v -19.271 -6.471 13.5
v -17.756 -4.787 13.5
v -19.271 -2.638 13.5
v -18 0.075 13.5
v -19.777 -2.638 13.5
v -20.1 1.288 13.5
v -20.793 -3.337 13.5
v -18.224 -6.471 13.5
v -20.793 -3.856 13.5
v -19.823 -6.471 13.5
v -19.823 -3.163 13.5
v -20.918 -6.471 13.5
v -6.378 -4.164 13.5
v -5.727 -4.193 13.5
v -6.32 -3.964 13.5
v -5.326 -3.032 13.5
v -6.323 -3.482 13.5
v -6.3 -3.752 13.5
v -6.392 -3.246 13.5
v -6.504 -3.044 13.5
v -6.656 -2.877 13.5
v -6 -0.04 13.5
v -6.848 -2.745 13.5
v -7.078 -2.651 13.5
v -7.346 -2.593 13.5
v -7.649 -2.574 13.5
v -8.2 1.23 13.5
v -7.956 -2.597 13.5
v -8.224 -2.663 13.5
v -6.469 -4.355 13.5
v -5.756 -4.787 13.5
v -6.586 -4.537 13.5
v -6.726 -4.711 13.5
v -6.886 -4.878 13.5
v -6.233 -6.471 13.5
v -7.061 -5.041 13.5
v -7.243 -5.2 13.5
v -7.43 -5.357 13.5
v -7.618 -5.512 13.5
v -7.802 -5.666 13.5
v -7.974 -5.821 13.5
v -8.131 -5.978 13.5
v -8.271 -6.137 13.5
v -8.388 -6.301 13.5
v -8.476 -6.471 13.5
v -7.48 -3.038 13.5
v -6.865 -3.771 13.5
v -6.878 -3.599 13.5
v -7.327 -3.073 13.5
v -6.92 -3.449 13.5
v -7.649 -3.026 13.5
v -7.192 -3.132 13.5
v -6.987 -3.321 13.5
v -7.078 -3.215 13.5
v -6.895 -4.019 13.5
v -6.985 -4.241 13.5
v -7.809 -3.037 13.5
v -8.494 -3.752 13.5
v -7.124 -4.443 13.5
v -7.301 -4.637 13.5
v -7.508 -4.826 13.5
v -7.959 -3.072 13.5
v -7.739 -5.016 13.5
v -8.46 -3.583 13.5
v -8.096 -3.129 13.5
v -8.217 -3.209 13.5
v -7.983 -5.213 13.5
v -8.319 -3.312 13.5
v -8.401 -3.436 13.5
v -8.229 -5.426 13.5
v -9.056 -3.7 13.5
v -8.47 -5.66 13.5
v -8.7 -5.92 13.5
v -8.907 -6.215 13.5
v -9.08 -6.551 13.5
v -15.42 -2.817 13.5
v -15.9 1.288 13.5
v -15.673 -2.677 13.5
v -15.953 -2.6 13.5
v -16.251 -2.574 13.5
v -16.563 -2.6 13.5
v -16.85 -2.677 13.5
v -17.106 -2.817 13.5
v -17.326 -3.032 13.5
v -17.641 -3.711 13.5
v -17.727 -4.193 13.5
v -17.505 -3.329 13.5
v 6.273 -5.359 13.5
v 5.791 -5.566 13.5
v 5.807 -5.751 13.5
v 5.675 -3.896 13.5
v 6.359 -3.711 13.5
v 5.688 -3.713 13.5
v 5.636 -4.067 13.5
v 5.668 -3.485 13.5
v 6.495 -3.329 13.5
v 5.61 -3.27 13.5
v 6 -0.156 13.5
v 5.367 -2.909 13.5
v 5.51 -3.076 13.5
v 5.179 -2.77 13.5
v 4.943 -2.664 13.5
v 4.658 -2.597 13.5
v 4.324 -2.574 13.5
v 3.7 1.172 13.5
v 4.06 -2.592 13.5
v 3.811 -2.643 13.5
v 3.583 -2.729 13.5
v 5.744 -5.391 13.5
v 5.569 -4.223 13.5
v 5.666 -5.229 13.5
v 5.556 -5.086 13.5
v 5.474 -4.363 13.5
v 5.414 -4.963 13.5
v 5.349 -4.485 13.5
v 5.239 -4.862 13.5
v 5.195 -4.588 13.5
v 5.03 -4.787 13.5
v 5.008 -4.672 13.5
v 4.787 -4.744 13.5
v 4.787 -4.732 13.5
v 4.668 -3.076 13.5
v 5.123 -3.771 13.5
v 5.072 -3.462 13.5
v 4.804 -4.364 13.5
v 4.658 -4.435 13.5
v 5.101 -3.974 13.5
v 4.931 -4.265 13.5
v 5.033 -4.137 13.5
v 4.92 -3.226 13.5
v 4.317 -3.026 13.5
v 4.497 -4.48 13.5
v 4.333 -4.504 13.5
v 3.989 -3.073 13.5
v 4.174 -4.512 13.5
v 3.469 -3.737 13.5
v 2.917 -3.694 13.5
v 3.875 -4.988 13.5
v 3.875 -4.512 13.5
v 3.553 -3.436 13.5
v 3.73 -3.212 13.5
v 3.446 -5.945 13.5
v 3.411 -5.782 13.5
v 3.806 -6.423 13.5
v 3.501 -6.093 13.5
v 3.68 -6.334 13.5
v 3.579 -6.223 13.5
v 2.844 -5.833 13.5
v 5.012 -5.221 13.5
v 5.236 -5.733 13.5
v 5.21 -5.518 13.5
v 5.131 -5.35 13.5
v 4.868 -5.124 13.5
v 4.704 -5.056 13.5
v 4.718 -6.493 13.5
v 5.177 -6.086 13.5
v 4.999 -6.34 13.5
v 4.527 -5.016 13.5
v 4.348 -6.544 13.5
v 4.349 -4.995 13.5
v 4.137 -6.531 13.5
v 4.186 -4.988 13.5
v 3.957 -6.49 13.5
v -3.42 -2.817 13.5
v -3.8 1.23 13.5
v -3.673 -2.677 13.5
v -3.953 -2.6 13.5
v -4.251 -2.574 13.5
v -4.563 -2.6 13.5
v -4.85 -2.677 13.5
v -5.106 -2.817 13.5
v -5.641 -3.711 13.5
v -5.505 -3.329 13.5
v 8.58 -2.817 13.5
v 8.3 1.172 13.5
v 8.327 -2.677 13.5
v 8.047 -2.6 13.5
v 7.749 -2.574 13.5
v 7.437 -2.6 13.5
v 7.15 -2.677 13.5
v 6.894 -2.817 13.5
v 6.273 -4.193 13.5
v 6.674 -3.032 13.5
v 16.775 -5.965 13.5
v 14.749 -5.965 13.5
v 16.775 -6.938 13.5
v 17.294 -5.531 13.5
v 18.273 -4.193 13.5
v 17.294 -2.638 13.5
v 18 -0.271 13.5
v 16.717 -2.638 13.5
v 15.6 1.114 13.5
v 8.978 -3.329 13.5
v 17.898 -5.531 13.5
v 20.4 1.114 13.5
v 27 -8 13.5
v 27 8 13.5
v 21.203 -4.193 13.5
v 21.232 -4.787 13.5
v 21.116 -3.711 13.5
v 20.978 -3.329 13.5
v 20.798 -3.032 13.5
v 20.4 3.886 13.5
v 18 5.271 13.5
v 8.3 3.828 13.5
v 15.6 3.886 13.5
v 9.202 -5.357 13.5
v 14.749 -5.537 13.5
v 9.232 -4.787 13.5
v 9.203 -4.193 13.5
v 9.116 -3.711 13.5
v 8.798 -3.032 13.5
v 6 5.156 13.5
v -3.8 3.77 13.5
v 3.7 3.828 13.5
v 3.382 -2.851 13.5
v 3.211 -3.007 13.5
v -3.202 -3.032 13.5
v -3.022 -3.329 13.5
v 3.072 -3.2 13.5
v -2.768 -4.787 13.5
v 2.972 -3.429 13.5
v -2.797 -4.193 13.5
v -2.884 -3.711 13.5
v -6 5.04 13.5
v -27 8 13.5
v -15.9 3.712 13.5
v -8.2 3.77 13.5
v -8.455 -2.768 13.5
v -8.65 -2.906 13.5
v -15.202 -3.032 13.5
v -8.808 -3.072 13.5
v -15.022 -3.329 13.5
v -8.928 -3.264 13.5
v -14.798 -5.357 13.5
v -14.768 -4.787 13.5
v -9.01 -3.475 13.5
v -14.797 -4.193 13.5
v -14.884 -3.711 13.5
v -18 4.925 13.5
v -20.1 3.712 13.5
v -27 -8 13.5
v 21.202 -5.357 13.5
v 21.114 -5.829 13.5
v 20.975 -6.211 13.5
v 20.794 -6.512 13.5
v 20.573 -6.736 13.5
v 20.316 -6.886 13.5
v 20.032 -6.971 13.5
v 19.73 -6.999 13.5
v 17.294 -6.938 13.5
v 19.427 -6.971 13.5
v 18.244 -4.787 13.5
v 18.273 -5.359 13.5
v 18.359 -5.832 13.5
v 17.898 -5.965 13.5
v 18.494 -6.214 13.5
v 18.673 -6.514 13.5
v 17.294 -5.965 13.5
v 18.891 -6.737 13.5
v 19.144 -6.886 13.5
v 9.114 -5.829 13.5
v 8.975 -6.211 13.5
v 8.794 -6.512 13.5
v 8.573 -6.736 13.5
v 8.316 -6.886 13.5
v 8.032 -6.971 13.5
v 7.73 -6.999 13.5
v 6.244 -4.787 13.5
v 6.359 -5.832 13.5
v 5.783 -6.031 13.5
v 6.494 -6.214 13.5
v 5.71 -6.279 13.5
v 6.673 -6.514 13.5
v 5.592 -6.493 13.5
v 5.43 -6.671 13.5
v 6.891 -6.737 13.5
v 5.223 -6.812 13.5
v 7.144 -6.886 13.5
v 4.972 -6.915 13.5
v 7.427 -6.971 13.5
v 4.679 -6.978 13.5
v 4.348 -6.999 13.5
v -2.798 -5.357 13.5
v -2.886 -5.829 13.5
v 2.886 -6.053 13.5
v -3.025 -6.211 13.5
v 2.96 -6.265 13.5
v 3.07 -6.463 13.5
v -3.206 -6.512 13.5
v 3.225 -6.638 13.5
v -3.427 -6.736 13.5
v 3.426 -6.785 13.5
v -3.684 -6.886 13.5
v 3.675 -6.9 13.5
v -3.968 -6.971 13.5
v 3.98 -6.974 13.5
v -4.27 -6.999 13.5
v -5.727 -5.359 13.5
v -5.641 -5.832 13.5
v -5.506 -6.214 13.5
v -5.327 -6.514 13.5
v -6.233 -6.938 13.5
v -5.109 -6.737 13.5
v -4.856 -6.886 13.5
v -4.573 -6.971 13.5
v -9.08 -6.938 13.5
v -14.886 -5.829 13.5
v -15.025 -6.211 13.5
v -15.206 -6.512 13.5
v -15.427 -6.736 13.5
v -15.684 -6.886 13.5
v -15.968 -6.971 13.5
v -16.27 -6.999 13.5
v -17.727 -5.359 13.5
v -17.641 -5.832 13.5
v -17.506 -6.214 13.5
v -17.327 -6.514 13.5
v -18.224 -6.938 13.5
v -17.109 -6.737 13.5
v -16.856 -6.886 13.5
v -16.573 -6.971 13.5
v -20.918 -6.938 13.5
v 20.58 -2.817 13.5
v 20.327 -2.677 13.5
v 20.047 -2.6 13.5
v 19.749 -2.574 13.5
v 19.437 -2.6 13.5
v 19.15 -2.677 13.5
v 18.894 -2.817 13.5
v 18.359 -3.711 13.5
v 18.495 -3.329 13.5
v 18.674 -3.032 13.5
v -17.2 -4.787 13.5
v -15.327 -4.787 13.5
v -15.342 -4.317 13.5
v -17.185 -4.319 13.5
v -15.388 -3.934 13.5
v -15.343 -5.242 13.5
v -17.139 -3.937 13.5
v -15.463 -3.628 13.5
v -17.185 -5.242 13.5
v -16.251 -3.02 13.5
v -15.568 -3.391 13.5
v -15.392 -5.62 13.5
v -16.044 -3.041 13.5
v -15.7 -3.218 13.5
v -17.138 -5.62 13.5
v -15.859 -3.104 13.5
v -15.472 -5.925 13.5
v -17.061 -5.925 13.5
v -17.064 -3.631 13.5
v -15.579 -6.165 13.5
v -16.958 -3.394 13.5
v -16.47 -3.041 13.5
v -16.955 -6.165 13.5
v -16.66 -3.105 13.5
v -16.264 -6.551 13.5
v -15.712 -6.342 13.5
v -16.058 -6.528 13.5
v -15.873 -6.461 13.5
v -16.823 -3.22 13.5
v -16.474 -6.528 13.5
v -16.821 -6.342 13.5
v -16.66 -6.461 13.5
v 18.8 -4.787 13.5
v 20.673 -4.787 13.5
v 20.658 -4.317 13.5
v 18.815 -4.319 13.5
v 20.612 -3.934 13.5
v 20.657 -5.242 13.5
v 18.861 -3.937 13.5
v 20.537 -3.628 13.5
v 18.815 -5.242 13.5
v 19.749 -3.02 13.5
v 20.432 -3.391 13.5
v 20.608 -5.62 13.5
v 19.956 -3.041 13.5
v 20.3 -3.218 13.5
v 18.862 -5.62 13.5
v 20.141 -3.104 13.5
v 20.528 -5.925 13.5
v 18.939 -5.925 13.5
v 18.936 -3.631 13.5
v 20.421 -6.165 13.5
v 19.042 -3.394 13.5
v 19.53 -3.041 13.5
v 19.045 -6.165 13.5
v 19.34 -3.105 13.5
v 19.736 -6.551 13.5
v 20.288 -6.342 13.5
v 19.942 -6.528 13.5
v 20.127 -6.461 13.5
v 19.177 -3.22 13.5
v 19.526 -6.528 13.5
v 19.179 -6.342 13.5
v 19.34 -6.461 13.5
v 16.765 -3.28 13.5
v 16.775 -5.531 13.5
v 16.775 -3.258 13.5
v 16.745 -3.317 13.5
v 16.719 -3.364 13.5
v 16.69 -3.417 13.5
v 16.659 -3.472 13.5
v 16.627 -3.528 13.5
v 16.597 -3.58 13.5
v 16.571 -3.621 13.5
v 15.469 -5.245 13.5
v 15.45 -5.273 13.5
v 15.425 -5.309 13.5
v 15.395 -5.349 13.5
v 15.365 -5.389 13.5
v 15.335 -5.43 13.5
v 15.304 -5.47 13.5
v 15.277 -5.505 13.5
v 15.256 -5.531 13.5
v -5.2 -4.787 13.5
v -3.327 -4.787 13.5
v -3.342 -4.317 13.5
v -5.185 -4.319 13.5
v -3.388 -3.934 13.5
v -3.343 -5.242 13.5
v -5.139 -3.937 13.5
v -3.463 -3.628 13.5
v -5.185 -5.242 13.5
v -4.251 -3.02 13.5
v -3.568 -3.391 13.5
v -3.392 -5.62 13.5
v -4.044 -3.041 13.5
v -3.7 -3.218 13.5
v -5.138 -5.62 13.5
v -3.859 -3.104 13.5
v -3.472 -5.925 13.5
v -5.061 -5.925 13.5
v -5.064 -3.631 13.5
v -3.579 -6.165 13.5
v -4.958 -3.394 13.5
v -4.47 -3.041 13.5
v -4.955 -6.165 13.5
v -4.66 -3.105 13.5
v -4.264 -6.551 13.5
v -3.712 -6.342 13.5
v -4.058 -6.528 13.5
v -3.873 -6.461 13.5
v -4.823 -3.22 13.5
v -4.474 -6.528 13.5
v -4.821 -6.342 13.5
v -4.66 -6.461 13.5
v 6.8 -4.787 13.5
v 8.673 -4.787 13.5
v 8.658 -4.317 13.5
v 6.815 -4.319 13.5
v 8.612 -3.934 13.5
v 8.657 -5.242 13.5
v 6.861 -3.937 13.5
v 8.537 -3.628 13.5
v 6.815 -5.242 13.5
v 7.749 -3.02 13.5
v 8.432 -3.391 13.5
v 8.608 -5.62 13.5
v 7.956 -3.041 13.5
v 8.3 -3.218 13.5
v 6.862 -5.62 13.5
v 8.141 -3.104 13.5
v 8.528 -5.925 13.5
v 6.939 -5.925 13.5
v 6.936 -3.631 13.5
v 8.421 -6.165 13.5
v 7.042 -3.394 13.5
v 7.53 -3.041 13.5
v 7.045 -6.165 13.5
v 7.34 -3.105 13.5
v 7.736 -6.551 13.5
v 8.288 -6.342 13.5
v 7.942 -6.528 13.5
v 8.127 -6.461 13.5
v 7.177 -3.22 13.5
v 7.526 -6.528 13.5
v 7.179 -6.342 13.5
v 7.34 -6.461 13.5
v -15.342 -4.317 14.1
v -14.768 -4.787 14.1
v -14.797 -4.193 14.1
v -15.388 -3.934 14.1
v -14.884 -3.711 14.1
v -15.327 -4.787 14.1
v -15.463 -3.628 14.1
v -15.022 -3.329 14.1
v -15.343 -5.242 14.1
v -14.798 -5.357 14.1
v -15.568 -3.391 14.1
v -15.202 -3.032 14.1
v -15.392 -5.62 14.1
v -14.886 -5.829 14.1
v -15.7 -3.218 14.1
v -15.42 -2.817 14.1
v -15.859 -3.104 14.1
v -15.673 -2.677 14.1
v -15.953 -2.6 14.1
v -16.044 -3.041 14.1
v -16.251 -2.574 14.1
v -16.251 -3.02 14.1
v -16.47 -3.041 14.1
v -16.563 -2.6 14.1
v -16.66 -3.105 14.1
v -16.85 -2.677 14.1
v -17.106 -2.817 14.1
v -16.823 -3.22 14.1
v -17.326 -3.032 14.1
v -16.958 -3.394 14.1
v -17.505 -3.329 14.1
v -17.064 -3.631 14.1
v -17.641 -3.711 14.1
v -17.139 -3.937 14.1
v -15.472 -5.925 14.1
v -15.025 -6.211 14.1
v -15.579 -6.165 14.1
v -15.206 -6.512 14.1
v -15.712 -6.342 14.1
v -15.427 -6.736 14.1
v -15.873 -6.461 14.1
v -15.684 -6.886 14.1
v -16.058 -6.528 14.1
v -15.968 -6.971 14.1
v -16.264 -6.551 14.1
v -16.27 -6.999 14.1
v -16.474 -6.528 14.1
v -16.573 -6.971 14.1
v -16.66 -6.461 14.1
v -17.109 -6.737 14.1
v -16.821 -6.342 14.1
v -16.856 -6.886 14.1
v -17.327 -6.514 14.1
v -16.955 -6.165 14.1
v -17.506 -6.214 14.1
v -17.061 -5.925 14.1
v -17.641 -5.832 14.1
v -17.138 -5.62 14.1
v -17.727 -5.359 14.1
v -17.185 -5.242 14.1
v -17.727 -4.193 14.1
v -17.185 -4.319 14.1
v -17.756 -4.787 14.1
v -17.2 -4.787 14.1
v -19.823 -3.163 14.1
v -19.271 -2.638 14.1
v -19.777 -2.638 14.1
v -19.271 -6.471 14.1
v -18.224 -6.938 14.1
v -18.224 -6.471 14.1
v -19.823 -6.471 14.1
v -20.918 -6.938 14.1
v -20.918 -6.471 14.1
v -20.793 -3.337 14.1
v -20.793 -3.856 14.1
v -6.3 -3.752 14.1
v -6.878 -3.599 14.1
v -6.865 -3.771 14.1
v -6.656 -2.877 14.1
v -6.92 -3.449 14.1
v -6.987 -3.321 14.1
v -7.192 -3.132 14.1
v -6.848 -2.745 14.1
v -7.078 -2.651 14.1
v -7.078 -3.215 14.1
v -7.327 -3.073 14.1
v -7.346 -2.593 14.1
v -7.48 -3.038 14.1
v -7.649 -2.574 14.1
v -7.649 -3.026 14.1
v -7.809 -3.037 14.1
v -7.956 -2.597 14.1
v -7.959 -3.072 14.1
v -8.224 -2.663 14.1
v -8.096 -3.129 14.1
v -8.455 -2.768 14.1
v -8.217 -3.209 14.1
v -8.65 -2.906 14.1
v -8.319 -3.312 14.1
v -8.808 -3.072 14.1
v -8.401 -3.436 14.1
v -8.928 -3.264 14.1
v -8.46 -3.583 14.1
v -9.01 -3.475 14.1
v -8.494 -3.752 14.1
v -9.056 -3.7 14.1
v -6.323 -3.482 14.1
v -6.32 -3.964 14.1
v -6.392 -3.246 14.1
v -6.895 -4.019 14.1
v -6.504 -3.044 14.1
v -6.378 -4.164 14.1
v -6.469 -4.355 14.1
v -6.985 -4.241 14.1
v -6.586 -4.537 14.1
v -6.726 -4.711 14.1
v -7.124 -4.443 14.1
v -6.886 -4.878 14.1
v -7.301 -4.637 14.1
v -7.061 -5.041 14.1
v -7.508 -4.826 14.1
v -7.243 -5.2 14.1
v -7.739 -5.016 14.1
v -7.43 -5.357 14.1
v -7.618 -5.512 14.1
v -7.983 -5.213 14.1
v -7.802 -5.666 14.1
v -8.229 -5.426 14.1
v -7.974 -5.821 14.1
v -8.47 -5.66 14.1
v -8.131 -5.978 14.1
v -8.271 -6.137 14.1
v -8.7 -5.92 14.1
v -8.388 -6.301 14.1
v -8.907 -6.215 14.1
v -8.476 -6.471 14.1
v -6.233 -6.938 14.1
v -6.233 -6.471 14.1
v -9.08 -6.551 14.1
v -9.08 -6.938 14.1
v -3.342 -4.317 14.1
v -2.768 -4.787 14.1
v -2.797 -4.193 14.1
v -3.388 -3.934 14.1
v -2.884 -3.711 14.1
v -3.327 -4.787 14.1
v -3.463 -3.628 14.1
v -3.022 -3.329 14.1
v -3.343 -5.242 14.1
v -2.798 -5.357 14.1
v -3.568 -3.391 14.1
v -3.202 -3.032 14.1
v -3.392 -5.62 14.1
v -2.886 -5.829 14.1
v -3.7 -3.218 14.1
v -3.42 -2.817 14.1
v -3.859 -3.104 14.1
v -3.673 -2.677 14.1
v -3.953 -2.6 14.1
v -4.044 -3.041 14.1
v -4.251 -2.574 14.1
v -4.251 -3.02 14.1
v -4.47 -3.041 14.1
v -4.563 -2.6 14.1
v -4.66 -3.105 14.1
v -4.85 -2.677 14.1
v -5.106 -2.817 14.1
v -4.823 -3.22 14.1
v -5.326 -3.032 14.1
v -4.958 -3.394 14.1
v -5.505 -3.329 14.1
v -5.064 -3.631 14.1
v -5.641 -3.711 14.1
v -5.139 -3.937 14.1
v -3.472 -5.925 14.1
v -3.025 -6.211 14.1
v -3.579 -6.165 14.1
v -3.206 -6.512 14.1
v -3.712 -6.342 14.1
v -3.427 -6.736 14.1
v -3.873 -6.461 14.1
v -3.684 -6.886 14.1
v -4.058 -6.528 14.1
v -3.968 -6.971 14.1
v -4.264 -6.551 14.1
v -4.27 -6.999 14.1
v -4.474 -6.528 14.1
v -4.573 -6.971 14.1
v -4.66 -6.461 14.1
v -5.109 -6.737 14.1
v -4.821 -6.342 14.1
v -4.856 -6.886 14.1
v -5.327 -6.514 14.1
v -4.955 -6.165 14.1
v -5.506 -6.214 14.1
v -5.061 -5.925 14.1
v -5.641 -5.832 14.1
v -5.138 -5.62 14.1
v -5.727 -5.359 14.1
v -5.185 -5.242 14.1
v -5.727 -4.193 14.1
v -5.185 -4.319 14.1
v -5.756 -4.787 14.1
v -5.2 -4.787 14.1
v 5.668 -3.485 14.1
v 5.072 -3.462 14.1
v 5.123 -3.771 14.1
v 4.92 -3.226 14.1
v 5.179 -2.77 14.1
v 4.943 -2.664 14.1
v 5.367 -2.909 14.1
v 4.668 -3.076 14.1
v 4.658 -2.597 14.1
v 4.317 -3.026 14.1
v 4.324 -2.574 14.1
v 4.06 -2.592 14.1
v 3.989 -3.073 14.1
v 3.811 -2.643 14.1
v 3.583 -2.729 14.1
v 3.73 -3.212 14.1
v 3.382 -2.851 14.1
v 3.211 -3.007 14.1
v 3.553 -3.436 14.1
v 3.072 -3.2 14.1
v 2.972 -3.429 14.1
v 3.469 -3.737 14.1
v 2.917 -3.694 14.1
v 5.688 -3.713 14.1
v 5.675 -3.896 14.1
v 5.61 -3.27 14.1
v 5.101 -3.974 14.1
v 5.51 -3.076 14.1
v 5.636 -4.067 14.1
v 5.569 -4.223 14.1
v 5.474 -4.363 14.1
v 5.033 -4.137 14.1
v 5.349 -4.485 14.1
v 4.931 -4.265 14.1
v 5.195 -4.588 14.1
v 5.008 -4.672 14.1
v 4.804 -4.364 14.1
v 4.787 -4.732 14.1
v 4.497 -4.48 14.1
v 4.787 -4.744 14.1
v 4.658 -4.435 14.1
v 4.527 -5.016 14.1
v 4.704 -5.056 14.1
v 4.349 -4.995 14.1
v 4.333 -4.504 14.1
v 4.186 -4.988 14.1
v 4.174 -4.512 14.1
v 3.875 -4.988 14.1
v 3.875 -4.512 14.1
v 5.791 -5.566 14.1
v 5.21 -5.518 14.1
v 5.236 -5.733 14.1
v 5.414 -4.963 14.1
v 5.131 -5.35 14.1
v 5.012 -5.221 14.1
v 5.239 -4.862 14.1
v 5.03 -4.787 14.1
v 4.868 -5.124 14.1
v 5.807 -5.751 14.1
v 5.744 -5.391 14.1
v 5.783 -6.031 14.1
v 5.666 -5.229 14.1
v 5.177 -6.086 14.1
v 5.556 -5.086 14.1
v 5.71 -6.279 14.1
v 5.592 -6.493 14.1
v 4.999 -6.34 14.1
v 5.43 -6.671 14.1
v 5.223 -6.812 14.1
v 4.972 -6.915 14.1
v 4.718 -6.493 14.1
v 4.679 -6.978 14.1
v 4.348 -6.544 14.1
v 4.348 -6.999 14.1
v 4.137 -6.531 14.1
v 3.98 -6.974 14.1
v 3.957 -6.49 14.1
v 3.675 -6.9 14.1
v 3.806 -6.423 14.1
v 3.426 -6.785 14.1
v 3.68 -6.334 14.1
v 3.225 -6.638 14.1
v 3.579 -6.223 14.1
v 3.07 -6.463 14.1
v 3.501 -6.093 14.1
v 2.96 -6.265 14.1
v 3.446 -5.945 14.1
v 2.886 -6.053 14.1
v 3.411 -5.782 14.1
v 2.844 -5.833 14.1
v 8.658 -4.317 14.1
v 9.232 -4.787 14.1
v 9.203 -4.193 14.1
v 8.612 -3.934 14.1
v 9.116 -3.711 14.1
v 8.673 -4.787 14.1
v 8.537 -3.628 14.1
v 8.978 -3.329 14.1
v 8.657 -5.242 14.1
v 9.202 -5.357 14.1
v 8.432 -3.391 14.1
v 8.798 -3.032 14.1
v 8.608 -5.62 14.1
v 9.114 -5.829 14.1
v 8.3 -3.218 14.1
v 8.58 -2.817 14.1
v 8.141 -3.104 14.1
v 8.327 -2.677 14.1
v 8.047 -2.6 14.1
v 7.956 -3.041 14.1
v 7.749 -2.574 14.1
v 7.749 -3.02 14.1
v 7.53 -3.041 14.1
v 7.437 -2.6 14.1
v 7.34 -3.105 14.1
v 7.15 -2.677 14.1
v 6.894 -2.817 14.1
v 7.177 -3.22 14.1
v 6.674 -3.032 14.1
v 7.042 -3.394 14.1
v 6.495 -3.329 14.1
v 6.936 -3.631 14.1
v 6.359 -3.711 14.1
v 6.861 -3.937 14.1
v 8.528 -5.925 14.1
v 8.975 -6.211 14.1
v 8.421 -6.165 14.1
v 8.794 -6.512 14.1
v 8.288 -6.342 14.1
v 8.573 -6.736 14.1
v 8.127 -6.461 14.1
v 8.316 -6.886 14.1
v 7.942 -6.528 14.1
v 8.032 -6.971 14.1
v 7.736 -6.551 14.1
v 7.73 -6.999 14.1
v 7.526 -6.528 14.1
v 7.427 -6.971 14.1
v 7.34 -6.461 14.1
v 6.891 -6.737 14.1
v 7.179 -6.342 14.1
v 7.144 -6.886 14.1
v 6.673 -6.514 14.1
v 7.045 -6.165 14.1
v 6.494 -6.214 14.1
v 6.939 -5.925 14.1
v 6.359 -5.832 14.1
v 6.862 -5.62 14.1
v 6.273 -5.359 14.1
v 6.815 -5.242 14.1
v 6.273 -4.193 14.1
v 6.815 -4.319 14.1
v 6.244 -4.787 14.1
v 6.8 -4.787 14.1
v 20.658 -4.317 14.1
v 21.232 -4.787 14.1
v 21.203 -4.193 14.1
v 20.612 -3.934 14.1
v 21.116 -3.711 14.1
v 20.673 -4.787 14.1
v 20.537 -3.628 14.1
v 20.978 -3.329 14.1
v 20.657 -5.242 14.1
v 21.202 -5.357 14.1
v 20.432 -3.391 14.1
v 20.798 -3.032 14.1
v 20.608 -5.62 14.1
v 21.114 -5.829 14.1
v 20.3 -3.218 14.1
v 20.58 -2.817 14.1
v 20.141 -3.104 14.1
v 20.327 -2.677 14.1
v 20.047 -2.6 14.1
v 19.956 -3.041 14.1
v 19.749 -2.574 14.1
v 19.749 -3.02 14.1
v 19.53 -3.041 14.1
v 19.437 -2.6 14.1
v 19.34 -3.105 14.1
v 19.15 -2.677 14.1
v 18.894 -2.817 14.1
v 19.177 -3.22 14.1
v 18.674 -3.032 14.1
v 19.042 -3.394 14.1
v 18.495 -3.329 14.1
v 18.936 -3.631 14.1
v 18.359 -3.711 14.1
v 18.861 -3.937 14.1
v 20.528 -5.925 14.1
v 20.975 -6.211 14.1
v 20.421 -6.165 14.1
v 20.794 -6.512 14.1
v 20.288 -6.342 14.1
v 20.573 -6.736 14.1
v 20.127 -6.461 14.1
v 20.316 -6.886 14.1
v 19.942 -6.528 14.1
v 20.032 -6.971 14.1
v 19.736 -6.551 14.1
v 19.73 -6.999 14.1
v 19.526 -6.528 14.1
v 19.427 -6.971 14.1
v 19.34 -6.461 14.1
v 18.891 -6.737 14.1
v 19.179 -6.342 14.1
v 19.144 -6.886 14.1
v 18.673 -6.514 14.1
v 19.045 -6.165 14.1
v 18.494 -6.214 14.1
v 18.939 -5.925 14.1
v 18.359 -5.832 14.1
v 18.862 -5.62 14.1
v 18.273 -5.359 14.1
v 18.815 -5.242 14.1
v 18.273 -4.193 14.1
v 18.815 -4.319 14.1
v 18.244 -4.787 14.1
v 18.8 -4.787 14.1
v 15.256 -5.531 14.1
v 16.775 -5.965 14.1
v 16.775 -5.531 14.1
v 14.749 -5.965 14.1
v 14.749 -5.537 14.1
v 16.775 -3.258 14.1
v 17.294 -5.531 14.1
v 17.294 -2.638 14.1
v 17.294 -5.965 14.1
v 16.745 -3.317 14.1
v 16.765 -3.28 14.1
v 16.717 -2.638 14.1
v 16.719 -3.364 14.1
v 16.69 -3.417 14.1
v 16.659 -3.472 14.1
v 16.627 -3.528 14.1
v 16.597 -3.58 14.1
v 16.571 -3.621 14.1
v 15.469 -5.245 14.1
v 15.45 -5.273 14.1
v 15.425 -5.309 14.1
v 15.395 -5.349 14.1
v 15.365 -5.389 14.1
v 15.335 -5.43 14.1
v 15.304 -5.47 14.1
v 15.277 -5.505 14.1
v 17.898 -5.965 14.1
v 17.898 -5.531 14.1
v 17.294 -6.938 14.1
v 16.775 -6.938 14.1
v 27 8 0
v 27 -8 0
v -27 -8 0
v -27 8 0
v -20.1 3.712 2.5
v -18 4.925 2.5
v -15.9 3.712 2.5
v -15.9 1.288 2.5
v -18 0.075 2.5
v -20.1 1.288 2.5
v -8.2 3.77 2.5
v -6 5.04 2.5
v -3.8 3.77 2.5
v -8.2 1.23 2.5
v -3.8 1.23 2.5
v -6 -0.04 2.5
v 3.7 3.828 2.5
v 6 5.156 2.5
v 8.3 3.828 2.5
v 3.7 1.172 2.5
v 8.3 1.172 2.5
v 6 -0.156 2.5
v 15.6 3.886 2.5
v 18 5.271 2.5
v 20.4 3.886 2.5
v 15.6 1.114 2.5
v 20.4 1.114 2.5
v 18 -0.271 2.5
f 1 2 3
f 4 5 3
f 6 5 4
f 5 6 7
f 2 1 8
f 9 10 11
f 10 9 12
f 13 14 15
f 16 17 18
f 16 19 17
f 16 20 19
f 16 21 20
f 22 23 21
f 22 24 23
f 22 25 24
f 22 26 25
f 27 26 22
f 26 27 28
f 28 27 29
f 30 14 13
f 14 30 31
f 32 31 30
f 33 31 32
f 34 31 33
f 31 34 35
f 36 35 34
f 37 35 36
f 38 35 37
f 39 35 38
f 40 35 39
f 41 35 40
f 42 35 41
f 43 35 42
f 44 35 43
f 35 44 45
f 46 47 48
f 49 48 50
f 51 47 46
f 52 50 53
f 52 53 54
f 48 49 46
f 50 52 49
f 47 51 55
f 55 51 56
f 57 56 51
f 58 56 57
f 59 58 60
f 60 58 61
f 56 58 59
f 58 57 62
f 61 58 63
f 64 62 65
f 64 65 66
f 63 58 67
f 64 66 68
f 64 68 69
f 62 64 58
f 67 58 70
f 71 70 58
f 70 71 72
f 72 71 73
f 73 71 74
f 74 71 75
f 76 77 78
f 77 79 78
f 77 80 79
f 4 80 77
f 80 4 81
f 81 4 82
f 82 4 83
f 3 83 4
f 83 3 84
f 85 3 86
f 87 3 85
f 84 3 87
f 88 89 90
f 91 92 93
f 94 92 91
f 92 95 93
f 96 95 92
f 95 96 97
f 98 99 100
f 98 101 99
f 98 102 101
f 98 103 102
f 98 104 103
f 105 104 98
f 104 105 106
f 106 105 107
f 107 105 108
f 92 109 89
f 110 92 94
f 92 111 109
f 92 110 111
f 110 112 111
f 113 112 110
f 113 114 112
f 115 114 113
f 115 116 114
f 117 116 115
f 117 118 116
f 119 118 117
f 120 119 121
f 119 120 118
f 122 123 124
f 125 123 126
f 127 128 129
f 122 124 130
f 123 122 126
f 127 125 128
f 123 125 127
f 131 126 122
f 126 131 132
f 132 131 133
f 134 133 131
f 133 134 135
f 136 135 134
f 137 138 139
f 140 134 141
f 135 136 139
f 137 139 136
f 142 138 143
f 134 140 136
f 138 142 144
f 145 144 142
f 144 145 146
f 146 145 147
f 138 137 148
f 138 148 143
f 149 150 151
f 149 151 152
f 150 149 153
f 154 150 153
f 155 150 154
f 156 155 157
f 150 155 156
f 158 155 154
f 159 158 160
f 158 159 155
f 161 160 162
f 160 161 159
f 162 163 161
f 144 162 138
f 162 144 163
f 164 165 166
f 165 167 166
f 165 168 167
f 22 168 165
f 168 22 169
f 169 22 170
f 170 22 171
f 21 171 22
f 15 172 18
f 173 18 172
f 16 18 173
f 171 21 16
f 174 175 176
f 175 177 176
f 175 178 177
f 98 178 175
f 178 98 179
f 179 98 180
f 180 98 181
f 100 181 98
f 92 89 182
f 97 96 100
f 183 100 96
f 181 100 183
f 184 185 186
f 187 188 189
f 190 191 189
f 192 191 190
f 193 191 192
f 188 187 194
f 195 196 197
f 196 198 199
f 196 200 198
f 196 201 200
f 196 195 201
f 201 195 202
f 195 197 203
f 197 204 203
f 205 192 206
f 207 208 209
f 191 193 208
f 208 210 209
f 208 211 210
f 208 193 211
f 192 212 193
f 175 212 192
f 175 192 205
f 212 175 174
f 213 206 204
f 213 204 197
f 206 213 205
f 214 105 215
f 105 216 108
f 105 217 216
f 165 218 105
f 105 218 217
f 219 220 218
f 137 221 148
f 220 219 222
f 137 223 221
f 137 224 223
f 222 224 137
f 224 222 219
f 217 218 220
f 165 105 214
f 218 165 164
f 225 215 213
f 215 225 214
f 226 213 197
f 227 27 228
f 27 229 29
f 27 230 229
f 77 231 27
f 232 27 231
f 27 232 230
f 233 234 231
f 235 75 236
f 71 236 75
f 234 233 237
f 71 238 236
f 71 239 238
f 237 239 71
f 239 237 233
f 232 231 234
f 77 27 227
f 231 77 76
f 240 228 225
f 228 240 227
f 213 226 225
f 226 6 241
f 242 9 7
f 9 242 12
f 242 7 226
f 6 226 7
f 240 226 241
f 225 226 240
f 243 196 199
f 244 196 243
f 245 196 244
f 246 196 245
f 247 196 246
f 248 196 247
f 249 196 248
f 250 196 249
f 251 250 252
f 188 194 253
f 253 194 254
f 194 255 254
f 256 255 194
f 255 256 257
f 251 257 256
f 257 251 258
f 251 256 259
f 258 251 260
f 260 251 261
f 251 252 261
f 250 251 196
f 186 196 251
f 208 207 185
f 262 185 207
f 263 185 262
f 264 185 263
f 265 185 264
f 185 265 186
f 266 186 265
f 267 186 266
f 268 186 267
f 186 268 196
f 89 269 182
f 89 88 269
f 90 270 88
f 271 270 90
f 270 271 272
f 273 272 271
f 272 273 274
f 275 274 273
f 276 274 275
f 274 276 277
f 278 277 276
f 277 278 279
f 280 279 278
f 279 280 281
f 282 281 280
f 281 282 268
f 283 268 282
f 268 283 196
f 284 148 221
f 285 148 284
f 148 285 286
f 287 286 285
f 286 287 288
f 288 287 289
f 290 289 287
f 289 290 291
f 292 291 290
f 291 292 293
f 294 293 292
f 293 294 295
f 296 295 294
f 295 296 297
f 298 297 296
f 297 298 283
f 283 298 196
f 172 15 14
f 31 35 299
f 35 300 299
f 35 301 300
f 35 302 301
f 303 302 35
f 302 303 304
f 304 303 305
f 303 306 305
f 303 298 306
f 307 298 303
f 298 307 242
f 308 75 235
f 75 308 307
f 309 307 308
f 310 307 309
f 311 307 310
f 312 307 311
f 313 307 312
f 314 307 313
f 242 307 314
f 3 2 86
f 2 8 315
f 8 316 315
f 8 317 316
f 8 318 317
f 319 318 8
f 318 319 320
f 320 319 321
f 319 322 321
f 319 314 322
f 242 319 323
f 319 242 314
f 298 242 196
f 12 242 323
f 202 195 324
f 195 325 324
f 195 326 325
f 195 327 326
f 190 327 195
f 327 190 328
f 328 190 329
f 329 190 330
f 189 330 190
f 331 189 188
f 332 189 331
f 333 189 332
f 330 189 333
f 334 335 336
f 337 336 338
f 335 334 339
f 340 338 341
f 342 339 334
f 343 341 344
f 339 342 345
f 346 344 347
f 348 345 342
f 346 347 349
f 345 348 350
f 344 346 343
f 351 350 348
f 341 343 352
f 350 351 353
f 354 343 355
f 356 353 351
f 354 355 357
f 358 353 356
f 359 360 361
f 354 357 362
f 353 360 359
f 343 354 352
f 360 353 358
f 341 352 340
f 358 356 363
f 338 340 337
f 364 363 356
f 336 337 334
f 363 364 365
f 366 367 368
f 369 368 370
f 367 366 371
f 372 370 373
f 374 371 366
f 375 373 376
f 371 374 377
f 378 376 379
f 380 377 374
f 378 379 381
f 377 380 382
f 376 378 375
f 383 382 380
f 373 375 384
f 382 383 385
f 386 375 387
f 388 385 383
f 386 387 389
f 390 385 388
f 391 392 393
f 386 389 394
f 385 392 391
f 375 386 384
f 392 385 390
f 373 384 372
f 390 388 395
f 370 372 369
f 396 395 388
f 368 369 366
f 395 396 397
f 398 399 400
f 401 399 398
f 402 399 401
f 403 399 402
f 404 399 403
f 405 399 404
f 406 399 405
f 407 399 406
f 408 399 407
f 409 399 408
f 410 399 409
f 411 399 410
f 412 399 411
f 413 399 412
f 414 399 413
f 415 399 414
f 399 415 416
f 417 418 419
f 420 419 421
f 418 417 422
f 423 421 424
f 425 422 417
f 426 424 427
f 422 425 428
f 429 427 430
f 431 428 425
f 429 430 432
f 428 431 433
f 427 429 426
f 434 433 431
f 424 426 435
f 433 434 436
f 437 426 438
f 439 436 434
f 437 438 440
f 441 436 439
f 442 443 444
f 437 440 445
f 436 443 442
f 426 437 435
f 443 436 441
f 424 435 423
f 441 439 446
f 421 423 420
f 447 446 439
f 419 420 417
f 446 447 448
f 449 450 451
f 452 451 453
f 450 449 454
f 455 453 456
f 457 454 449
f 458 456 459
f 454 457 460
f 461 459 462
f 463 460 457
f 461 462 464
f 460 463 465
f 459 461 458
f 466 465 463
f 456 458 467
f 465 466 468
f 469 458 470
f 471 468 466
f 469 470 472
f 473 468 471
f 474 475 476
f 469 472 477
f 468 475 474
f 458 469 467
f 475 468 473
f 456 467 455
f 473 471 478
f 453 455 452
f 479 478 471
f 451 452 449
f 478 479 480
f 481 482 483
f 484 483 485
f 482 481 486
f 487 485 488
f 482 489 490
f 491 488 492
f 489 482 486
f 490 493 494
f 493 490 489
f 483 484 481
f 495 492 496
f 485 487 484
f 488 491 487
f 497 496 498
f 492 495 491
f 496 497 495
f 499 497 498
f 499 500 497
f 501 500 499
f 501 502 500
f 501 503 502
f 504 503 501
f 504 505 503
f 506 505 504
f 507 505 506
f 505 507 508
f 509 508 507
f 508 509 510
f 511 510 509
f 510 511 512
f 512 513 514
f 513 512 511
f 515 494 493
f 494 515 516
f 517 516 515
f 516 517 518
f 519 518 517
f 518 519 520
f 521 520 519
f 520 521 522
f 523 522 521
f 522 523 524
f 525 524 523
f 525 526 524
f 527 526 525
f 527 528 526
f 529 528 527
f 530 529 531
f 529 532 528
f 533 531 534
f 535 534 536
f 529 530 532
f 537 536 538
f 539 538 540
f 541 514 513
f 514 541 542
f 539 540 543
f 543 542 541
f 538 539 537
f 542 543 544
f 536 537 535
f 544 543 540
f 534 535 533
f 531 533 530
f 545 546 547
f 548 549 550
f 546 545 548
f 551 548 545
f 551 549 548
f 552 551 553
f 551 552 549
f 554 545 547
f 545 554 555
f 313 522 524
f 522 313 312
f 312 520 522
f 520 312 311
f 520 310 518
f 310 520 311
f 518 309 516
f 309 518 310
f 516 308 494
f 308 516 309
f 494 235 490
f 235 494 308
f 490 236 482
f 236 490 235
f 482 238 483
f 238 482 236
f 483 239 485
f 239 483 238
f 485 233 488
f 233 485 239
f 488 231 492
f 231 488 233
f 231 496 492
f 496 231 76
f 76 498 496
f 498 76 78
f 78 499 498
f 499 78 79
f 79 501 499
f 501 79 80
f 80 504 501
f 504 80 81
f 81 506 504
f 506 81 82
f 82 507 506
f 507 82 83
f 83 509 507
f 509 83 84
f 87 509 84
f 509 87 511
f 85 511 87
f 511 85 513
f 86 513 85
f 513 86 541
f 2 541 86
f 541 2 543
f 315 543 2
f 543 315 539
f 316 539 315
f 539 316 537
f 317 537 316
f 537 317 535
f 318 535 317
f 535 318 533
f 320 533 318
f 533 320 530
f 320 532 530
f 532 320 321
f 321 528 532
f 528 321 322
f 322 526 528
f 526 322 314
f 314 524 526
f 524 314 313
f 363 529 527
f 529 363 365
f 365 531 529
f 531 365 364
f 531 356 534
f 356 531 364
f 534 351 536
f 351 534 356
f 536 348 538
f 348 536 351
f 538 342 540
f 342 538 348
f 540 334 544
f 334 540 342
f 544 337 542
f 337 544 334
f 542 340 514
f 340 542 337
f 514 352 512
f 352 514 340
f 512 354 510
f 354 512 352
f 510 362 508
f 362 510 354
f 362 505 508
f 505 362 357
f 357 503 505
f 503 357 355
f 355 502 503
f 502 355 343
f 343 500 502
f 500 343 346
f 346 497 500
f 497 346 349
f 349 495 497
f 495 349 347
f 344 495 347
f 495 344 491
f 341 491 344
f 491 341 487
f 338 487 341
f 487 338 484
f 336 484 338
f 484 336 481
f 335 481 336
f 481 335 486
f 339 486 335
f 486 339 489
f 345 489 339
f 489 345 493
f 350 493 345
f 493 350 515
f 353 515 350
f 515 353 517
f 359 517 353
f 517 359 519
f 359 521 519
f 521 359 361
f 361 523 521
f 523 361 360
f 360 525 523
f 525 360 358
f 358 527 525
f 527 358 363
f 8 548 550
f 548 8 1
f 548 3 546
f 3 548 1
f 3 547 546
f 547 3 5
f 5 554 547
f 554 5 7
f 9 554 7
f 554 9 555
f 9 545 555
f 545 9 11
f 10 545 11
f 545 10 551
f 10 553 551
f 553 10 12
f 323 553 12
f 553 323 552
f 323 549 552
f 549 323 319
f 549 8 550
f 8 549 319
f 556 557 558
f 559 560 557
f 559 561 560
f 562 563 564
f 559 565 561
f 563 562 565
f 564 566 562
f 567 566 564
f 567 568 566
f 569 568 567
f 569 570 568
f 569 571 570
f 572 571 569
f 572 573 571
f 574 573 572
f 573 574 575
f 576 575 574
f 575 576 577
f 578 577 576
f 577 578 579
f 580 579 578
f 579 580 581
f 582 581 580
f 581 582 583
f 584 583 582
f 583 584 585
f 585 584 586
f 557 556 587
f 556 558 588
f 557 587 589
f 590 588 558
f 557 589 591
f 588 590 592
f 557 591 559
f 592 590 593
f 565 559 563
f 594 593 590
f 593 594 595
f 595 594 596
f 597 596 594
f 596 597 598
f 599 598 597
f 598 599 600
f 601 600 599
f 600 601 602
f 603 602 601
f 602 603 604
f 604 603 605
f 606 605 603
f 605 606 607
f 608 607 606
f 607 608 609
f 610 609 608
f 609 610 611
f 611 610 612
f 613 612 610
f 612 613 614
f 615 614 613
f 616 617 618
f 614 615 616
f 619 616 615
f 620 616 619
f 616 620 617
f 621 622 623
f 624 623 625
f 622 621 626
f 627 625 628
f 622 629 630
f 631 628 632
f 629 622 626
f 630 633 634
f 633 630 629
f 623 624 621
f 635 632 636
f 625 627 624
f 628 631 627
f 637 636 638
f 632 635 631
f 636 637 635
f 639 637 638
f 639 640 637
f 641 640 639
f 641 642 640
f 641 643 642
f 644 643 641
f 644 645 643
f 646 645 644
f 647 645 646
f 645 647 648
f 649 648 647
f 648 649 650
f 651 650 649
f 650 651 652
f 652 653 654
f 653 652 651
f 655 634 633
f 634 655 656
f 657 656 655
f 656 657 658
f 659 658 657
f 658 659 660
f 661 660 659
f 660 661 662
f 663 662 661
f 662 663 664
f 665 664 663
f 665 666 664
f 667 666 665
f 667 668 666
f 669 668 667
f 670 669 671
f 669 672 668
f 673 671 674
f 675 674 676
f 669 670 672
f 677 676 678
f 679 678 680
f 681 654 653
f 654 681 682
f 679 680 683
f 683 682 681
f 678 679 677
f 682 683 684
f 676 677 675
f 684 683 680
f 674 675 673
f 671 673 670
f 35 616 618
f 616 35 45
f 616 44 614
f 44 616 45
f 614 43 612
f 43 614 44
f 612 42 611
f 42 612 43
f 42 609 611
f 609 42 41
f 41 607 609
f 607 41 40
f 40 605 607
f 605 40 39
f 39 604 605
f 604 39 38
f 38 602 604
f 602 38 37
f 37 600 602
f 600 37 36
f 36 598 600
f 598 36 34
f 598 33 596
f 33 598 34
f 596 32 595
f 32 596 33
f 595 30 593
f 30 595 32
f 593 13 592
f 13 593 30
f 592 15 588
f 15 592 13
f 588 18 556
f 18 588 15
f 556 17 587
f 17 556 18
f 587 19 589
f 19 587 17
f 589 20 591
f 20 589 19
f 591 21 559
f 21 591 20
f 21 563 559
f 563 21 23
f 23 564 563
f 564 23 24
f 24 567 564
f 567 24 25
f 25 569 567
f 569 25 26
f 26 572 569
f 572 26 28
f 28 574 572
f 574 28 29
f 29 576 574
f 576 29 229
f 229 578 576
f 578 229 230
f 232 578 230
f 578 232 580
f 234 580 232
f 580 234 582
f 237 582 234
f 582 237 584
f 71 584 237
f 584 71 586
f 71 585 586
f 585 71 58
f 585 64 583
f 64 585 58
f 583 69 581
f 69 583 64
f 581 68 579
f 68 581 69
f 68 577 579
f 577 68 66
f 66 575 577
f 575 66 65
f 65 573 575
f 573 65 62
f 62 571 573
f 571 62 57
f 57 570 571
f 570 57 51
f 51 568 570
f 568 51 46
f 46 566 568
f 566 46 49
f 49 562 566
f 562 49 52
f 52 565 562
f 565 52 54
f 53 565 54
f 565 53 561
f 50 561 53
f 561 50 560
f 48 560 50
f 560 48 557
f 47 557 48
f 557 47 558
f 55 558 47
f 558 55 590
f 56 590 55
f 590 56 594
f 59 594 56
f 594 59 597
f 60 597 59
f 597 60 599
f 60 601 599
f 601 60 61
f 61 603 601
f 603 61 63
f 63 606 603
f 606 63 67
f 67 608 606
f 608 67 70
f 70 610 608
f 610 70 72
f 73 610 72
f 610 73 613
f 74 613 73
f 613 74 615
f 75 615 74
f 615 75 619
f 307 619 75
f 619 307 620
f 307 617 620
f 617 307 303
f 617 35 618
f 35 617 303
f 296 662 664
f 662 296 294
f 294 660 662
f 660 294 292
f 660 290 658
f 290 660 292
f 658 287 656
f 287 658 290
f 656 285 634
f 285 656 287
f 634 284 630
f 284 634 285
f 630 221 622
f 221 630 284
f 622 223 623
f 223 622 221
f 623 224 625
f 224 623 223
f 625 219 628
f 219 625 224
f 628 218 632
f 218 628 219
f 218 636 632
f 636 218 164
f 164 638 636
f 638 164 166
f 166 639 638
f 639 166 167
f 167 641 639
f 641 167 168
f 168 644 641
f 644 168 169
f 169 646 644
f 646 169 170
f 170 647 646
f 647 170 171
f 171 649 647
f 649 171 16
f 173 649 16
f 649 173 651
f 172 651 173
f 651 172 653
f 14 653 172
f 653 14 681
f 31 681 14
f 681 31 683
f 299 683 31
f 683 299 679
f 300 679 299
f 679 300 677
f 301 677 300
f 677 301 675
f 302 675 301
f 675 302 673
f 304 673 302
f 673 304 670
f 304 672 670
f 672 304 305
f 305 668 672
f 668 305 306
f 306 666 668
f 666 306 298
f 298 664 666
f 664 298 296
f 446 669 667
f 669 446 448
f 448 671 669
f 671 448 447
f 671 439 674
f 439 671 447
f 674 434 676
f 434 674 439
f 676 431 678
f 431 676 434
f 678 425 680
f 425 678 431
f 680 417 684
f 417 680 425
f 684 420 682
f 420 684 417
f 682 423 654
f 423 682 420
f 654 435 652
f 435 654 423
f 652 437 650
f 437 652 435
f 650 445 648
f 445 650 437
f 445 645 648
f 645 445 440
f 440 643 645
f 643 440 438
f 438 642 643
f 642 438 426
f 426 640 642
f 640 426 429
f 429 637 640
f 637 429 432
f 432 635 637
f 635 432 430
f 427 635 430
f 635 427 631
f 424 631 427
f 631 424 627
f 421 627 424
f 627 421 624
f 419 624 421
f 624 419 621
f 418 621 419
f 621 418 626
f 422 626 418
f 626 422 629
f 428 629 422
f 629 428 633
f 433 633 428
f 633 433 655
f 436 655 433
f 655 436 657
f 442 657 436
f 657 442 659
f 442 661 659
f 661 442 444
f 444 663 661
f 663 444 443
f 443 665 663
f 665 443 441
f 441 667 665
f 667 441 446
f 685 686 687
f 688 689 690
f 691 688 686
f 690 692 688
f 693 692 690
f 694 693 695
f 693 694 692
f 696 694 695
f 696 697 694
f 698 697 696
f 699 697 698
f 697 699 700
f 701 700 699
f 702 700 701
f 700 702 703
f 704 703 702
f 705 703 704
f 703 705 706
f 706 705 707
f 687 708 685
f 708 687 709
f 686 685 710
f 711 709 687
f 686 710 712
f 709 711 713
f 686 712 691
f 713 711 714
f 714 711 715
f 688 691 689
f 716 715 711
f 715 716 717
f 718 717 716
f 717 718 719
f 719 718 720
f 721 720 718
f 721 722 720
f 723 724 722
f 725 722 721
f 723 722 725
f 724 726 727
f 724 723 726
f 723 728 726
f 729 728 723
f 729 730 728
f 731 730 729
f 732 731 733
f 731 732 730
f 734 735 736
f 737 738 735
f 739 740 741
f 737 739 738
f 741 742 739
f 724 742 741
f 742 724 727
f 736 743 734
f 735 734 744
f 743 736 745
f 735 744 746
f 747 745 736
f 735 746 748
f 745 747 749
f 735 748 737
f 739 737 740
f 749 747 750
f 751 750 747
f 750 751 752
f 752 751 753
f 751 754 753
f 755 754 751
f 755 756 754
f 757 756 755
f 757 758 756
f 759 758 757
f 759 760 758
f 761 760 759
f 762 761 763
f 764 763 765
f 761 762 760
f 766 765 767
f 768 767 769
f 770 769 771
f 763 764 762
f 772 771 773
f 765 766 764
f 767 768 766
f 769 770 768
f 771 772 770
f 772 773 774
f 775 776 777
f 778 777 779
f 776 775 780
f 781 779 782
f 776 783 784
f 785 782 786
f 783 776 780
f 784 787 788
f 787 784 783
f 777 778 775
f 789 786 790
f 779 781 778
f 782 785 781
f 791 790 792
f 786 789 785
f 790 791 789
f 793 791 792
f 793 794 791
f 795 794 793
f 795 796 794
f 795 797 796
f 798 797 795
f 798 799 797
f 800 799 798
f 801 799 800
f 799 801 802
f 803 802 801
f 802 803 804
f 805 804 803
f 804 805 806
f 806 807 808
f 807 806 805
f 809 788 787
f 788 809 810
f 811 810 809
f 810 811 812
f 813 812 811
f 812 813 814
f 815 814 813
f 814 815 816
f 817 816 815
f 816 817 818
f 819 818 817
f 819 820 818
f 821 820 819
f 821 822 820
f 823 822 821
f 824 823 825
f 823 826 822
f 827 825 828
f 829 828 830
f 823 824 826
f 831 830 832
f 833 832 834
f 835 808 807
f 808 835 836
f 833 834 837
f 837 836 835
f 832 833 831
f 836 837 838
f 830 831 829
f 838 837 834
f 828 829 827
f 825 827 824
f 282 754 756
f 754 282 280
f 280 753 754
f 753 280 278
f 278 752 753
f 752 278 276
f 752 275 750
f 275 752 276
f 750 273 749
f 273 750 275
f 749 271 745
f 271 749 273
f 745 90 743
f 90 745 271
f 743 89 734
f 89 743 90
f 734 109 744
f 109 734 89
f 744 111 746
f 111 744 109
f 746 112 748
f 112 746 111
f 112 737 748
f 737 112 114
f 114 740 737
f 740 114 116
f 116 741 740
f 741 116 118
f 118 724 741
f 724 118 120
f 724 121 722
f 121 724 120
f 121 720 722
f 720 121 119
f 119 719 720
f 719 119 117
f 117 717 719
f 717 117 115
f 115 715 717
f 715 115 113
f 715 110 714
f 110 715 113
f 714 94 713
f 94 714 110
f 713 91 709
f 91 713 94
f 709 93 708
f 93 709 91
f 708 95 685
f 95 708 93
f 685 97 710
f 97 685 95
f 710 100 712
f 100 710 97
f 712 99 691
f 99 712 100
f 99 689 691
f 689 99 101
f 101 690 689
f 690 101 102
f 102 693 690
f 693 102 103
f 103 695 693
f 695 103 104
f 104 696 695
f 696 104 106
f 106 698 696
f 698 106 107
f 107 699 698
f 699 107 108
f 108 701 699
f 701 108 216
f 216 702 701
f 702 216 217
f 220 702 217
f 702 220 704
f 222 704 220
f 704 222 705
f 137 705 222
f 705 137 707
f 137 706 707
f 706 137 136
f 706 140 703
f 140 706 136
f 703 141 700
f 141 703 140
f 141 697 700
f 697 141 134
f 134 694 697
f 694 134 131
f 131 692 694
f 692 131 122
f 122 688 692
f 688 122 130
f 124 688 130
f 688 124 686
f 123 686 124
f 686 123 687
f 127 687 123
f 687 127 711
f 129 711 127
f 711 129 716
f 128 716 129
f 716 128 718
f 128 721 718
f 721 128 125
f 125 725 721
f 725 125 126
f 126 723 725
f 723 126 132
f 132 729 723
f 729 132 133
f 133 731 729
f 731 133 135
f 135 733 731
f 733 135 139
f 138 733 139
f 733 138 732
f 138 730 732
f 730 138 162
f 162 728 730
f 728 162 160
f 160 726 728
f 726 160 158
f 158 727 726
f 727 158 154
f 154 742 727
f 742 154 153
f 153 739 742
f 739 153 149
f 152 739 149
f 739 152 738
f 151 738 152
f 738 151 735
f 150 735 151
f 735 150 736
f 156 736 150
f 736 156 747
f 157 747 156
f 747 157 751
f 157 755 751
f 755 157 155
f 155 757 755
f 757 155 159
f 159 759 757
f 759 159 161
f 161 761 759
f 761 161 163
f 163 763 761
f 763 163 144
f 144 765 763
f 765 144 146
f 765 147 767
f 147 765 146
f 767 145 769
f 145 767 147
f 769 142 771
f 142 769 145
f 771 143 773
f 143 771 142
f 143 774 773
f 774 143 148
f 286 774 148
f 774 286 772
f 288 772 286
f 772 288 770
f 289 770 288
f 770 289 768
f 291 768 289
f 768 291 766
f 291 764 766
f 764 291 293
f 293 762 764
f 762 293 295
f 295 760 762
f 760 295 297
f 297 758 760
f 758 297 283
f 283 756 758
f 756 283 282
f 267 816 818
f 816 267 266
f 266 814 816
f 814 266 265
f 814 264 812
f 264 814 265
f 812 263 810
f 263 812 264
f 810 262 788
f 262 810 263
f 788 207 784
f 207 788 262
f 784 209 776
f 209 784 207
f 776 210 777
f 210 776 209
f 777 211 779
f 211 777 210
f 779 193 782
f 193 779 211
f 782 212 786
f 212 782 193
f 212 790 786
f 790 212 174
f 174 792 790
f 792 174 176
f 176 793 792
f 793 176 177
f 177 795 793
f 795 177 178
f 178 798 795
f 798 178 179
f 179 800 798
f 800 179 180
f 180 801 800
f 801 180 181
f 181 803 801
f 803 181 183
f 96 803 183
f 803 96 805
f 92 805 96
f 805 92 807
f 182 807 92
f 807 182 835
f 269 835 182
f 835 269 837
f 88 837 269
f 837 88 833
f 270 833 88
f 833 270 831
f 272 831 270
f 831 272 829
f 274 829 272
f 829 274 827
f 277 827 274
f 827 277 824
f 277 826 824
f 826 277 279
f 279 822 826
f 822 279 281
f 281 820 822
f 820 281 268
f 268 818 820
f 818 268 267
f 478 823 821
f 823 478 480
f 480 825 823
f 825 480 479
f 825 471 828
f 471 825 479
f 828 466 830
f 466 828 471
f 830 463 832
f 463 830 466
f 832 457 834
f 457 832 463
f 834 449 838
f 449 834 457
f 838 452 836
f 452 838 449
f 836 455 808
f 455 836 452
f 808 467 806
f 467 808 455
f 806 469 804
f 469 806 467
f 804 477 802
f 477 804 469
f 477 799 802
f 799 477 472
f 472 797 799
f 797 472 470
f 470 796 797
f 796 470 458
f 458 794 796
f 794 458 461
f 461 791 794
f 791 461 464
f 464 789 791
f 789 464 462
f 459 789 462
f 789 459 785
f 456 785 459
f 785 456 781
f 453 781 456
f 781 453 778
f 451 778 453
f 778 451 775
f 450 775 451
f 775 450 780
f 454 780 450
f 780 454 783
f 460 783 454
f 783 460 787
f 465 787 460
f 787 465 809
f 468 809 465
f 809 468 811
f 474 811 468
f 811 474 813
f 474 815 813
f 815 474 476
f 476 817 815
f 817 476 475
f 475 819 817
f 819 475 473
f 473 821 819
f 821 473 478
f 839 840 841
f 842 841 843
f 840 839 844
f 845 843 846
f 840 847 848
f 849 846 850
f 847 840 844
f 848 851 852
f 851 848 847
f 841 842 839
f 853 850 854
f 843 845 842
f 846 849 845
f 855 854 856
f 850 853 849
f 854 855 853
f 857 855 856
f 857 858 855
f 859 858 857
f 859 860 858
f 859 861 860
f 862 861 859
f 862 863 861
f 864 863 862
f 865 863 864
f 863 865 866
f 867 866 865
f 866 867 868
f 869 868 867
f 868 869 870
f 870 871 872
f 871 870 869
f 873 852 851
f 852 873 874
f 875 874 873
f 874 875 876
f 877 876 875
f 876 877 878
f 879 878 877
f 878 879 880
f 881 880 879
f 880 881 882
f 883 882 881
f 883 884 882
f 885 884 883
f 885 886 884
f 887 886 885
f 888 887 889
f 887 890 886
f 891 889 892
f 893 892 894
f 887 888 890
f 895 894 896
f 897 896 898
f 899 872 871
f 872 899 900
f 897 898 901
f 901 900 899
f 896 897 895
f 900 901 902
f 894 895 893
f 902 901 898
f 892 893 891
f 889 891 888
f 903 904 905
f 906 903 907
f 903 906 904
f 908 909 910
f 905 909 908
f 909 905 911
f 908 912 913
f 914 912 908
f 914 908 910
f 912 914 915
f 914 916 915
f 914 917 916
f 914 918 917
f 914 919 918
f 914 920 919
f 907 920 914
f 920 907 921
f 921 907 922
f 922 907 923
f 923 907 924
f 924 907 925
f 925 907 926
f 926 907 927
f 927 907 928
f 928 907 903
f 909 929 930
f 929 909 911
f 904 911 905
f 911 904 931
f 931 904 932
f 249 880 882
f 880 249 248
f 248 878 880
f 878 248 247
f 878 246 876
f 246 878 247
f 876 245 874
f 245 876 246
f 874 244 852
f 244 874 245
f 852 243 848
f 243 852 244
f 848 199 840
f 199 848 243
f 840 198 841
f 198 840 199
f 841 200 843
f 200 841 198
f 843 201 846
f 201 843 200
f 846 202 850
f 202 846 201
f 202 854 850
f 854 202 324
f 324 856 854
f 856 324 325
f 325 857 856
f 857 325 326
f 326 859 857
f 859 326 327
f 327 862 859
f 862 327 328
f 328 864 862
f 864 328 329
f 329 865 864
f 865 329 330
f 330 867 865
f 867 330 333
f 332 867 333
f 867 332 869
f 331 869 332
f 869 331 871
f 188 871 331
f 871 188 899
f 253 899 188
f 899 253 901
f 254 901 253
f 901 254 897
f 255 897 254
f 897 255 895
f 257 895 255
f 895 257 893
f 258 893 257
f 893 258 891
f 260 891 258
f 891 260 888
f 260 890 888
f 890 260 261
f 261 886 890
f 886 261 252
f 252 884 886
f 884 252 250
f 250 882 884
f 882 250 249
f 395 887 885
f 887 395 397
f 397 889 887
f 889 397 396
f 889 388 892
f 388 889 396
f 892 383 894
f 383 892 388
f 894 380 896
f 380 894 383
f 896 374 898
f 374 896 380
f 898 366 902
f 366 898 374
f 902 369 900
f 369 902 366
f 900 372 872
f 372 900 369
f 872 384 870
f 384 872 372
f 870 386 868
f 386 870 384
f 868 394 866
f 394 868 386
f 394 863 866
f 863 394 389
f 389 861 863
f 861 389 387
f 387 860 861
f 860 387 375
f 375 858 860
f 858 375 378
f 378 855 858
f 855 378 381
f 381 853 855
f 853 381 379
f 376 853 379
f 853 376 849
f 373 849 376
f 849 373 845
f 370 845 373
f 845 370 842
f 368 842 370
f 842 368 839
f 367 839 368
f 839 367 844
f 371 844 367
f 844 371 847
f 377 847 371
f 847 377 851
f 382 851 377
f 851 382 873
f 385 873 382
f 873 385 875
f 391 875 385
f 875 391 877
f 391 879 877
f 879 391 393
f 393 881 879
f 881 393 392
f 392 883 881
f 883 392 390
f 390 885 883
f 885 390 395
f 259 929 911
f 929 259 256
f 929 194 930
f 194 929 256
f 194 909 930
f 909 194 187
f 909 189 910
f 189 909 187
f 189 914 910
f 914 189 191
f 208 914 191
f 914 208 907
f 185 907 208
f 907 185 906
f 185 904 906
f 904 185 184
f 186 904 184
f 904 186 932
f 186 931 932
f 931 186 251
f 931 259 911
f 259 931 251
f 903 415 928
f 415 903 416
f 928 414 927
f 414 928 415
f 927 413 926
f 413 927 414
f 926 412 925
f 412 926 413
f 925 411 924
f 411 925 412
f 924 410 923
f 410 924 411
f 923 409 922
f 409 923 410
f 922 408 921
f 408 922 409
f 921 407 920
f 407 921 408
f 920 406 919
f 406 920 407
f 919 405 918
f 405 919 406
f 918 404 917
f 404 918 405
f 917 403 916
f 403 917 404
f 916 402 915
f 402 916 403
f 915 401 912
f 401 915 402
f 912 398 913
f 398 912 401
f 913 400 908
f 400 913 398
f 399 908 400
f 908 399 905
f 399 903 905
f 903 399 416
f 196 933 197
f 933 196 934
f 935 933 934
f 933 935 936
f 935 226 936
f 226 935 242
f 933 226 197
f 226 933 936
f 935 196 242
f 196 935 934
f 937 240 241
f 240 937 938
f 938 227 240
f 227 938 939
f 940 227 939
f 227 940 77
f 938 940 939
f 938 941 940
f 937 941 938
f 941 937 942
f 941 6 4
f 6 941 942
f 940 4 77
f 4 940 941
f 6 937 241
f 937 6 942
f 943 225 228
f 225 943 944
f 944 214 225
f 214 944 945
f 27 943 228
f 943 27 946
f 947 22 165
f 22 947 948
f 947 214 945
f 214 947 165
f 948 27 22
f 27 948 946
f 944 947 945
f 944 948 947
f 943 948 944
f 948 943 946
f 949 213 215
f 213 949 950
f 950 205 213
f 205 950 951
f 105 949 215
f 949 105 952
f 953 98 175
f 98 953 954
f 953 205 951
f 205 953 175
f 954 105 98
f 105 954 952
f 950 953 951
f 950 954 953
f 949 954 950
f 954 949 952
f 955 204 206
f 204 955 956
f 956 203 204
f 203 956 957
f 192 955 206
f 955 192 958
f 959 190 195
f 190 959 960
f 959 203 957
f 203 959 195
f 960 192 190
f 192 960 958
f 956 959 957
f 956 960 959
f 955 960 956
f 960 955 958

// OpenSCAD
// Console10 — 4mm hex-bit pocket FIT-TEST coupon
// ----------------------------------------------------------------------------
// Four hex pockets at different per-side clearances, at the real 11 mm depth, so
// you can drop a 4mm hex bit into each and pick the best fit. The clearance (x100)
// is embossed next to each pocket. Set HEX_CLR in Console10_bit_holder_handled.scad
// to the winner (e.g. pocket labelled "20" -> HEX_CLR = 0.20).
// ----------------------------------------------------------------------------

HEX_AF = 4.0;                       // 4mm hex bit across-flats
DEPTH  = 11;                        // real pocket depth
CLRS   = [0.10, 0.20, 0.30, 0.40];  // per-side clearance variants to try

pitch  = 12;
floor_t= 2.5;
bar_h  = DEPTH + floor_t;
bar_w  = 16;
n      = len(CLRS);
bar_l  = n*pitch + 6;

module hex_pocket(clr)
  rotate([0,0,30]) cylinder(d = (HEX_AF + 2*clr)/cos(30), h = DEPTH + 1, $fn = 6);

difference() {
  union() {
    translate([0, 0, bar_h/2]) cube([bar_l, bar_w, bar_h], center = true);
    // raised labels (clearance x100) along the front edge
    for (i = [0:n-1])
      translate([(i-(n-1)/2)*pitch, -bar_w/2 + 1, bar_h])
        linear_extrude(0.6) text(str(round(CLRS[i]*100)), size = 4.5, halign = "center", valign = "bottom");
  }
  // the hex pockets, drilled from the top
  for (i = [0:n-1])
    translate([(i-(n-1)/2)*pitch, 2.5, bar_h - DEPTH]) hex_pocket(CLRS[i]);
}
